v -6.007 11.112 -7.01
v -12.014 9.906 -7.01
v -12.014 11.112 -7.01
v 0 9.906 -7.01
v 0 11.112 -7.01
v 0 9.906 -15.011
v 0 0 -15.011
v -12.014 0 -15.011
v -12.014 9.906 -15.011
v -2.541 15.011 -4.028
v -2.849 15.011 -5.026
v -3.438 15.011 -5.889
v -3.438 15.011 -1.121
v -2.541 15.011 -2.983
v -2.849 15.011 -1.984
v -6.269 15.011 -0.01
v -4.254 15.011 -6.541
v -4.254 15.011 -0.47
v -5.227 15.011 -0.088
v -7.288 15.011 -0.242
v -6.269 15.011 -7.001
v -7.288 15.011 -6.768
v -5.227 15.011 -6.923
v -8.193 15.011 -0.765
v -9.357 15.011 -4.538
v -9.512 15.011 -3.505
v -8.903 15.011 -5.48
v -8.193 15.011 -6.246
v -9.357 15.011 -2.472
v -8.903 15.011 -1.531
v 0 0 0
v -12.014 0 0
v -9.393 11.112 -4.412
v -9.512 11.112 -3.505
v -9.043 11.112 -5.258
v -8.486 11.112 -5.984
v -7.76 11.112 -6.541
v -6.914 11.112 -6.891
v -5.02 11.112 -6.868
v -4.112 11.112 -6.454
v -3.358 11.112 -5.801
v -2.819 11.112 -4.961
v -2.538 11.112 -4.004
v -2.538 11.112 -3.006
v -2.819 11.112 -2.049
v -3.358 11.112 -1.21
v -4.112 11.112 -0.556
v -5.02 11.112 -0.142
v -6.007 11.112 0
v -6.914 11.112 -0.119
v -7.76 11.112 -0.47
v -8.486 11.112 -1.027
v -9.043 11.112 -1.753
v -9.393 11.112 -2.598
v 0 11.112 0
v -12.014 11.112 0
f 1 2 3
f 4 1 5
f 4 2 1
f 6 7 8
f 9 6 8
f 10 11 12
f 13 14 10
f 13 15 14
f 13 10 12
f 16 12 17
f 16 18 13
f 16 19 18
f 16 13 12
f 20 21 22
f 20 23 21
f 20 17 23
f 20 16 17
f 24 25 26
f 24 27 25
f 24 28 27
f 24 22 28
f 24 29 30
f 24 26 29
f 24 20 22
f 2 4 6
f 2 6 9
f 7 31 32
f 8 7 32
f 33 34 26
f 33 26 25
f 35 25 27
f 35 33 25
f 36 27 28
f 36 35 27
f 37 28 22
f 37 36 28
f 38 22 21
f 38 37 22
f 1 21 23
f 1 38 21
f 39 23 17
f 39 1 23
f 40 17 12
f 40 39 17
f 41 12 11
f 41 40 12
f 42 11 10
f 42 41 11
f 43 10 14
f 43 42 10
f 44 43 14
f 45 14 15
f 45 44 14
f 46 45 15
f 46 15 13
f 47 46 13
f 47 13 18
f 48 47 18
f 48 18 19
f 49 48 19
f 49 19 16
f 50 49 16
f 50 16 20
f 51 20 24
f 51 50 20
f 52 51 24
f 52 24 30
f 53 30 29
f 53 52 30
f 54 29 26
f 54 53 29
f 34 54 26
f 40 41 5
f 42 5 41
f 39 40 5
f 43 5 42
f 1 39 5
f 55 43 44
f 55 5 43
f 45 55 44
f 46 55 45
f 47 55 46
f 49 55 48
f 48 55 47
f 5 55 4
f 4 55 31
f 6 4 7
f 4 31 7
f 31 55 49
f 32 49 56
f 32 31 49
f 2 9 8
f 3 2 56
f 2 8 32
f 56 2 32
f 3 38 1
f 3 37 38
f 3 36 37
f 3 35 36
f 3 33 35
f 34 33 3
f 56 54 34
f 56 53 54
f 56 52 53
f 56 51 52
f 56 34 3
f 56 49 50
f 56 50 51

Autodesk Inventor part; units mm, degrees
ref_plane "YZ Plane" through (0, 0, 0) normal (1, 0, 0) x (0, 1, 0)
ref_plane "XZ Plane" through (0, 0, 0) normal (0, 1, 0) x (-1, 0, 0)
ref_plane "XY Plane" through (0, 0, 0) normal (0, 0, 1) x (1, 0, 0)
sketch "Sketch1" plane through (0, 0, 0) normal (0, 1, 0) x (-1, 0, 0)
  line L0 (0, 0) -> (12.0142, 0)
  line L1 (12.0142, 0) -> (12.0142, -7.0104)
  line L2 (12.0142, -7.0104) -> (0, -7.0104)
  line L3 (0, -7.0104) -> (0, 0)
  circle A0 centre (6.0071, -3.5052) radius 3.5052
  line L4 (12.0142, 0) -> (0, 0)
  line L5 (0, 0) -> (0, -15.0114)
  line L6 (0, -15.0114) -> (12.0142, -15.0114)
  line L7 (12.0142, -15.0114) -> (12.0142, 0)
  point P0 (0, -3.5052)
  point P1 (6.0071, -7.0104)
  point P2 (6.0071, 0)
  dimension "d0" = 12.0142
  dimension "d1" = 7.0104
  dimension "d2" = 3.5052
  dimension "d3" = 6.0071
  dimension "d4" = 7.0104
  dimension "d5" = 15.0114
extrude "Extrusion1" add sketch "Sketch1" along normal blind 9.906 contours L2 L7 L6 L5
extrude "Extrusion2" add sketch "Sketch1" along normal blind 11.1125 contours L0 A0 L2 L3 | L0 L1 L2 A0
extrude "Extrusion3" add sketch "Sketch1" along normal blind 15.0114 contours A0
properties part number "Audio_jack"
